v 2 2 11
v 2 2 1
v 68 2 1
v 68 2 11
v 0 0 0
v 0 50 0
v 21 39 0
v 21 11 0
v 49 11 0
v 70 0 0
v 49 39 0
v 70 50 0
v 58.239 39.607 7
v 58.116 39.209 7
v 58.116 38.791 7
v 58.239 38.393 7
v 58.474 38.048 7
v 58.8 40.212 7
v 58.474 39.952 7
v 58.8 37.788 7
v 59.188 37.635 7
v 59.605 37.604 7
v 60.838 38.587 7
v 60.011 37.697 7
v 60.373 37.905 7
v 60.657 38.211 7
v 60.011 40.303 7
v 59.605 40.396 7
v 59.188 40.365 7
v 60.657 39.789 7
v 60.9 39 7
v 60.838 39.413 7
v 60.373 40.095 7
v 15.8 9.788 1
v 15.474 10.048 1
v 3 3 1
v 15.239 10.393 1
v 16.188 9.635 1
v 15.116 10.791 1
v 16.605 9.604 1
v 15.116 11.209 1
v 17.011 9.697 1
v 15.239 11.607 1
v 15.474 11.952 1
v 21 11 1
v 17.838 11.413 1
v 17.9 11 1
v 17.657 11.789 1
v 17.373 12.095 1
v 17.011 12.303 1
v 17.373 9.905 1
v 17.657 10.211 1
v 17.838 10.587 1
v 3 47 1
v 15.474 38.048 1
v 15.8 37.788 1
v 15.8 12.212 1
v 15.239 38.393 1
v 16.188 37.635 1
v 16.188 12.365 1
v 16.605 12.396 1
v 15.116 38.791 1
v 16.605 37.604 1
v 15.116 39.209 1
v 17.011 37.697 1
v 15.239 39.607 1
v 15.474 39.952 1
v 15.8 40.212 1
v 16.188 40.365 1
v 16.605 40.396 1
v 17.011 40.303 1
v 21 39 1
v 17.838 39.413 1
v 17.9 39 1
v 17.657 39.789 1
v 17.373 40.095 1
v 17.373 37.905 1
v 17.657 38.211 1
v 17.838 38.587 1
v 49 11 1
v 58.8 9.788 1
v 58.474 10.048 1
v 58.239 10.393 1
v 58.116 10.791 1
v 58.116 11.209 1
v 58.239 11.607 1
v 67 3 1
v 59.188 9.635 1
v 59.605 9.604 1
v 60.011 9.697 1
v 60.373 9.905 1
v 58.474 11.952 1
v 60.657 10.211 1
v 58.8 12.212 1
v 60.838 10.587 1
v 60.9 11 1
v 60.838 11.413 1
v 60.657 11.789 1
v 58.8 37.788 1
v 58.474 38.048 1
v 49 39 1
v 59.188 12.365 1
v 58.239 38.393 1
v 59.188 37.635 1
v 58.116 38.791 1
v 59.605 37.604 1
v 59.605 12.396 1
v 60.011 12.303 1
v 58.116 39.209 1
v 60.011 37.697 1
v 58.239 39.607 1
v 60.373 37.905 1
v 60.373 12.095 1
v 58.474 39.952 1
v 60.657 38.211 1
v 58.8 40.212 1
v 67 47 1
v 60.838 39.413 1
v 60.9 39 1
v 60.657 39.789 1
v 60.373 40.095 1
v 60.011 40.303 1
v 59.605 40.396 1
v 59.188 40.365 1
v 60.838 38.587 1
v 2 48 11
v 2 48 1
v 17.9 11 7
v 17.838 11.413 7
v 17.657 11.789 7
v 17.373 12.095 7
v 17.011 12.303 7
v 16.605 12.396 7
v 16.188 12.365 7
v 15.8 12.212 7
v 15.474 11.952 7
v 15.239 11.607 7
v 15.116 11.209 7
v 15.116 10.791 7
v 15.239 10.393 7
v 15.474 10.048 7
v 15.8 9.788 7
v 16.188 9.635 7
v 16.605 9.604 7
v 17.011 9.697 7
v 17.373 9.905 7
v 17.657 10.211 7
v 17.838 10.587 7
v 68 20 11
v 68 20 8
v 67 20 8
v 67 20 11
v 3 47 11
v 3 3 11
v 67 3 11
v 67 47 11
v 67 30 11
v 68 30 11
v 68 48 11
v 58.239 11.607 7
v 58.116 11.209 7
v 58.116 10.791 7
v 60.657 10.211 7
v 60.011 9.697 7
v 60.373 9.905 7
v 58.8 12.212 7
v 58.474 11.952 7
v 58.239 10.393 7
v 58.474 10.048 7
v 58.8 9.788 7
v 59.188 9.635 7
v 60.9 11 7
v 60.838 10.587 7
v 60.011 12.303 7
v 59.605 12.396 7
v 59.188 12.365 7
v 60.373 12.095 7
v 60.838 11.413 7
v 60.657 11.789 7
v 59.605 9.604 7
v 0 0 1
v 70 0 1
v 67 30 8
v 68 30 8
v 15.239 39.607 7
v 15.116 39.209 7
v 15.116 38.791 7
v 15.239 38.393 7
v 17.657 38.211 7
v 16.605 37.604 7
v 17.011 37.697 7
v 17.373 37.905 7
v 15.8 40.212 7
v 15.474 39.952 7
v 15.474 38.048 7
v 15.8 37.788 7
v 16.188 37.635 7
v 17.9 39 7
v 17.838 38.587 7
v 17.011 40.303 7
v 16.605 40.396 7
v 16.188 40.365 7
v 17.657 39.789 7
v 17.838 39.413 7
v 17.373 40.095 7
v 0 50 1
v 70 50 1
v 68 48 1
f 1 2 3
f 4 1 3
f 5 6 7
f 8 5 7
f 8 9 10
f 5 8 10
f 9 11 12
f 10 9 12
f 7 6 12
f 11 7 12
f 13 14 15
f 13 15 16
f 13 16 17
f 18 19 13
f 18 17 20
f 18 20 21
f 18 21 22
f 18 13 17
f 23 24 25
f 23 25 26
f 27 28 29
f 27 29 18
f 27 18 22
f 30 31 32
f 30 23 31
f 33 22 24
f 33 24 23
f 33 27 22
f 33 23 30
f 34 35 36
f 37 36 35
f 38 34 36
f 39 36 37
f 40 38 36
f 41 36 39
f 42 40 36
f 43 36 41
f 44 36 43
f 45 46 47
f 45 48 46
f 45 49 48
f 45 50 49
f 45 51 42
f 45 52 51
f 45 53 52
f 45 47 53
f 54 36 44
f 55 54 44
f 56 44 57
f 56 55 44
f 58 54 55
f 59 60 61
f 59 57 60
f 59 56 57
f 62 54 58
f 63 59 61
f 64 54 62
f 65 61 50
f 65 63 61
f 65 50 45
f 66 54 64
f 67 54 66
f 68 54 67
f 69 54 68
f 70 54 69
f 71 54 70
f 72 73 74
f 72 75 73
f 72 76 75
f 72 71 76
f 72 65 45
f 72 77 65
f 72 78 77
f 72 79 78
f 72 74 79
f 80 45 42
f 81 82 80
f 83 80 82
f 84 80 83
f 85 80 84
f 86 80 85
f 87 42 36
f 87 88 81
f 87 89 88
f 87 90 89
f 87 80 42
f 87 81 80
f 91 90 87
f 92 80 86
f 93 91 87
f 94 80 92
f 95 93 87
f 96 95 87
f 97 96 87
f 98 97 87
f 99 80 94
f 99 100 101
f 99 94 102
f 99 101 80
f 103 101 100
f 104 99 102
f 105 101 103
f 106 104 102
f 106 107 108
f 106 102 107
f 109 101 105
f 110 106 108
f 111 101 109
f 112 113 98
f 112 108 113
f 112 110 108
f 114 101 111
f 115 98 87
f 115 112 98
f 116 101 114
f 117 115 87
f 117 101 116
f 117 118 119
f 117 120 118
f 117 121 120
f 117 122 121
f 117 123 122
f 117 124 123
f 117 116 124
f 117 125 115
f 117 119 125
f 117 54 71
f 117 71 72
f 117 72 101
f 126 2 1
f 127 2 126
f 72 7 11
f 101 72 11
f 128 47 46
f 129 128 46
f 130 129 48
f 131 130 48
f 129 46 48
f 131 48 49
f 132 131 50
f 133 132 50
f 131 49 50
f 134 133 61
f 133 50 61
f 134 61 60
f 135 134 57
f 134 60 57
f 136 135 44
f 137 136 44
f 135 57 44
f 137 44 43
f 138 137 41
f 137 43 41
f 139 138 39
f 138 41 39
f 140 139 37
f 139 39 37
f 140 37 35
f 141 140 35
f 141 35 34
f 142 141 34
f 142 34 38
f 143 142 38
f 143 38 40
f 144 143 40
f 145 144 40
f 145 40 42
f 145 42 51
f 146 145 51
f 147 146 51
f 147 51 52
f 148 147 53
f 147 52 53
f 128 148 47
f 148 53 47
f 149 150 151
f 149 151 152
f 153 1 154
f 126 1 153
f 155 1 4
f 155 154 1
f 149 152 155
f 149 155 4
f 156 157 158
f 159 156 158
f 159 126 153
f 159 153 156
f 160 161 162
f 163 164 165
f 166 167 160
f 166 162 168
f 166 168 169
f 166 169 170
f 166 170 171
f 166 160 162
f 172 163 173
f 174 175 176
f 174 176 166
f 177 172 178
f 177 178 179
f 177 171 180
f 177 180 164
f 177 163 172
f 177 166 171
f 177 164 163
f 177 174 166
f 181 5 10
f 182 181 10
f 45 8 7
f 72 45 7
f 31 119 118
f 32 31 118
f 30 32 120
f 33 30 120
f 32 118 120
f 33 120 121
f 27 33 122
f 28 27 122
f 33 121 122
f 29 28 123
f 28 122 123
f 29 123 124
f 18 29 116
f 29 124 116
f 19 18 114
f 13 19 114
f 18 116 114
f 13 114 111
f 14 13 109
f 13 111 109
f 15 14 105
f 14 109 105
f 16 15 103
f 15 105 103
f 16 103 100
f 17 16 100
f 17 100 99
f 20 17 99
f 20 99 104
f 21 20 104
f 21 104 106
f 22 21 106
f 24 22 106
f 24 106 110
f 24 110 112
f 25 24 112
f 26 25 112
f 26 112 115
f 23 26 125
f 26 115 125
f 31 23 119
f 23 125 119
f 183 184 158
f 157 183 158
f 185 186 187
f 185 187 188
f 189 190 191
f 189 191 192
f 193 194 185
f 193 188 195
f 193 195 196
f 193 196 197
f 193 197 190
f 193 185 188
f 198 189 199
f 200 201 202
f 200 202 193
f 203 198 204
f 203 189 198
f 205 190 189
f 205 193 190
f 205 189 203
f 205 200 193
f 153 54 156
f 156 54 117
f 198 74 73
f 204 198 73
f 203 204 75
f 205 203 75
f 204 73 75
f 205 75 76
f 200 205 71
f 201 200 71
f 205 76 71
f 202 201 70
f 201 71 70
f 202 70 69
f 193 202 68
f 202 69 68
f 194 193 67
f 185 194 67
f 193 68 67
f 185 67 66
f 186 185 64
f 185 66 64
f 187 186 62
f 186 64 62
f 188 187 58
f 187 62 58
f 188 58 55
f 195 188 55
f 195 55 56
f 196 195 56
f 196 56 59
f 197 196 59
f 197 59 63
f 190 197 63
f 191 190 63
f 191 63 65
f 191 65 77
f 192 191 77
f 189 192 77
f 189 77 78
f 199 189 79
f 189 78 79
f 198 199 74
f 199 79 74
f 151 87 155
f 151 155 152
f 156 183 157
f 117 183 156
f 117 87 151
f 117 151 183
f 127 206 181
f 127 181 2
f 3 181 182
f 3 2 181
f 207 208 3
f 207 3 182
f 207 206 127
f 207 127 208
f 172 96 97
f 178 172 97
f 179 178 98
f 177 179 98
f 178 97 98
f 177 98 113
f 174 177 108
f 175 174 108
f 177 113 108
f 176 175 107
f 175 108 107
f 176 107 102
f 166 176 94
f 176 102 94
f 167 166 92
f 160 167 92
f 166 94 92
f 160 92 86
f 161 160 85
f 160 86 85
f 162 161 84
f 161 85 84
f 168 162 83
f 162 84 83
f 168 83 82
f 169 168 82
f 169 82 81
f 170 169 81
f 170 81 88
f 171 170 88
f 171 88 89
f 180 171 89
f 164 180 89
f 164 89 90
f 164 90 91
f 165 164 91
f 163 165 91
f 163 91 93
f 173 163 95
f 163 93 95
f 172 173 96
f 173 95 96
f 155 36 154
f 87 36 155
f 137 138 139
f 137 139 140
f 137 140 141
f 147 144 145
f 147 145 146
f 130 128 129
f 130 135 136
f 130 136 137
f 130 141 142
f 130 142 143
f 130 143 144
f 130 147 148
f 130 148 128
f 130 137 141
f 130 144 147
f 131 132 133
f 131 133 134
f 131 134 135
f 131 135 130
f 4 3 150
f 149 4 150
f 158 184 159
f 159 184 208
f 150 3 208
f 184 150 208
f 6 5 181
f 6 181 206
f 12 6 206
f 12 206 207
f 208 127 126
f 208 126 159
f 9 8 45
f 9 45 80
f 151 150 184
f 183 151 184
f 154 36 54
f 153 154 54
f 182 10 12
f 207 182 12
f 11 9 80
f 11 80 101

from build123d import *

# Parameters (mm, degrees)
SKETCH005_W   = 70
SKETCH005_H   = 50
SKETCH005_W_2 = 28
SKETCH005_H_2 = 28
PAD_DEPTH     = 1
SKETCH006_R   = 1.4
PAD001_DEPTH  = 6
SKETCH007_W   = 66
SKETCH007_H   = 46
SKETCH007_W_2 = 64
SKETCH007_H_2 = 44
PAD002_DEPTH  = 10
SKETCH008_W   = 10
SKETCH008_H   = 3
POCKET_DEPTH  = 5


with BuildPart() as part:
    # Sketch005 → Pad (new body)
    with BuildSketch(Plane.XY):
        with Locations((35, 25)):
            Rectangle(SKETCH005_W, SKETCH005_H)
        with Locations((35, 25)):
            Rectangle(SKETCH005_W_2, SKETCH005_H_2, mode=Mode.SUBTRACT)
    extrude(amount=PAD_DEPTH)

    # Sketch006 → Pad001 (join)
    with BuildSketch(Plane.XY.offset(1)):
        with Locations((16.5, 39)):
            Circle(SKETCH006_R)
        with Locations((59.5, 39)):
            Circle(SKETCH006_R)
        with Locations((59.5, 11)):
            Circle(SKETCH006_R)
        with Locations((16.5, 11)):
            Circle(SKETCH006_R)
    extrude(amount=PAD001_DEPTH)

    # Sketch007 → Pad002 (join)
    with BuildSketch(Plane.XY.offset(1)):
        with Locations((35, 25)):
            Rectangle(SKETCH007_W, SKETCH007_H)
        with Locations((35, 25)):
            Rectangle(SKETCH007_W_2, SKETCH007_H_2, mode=Mode.SUBTRACT)
    extrude(amount=PAD002_DEPTH)

    # Sketch008 (on Face13 of Pad002) → Pocket (cut)
    with BuildSketch(Plane.YZ.offset(68)):
        with Locations((25, 9.5)):
            Rectangle(SKETCH008_W, SKETCH008_H)
    extrude(amount=-POCKET_DEPTH, mode=Mode.SUBTRACT)


solid = part.part
